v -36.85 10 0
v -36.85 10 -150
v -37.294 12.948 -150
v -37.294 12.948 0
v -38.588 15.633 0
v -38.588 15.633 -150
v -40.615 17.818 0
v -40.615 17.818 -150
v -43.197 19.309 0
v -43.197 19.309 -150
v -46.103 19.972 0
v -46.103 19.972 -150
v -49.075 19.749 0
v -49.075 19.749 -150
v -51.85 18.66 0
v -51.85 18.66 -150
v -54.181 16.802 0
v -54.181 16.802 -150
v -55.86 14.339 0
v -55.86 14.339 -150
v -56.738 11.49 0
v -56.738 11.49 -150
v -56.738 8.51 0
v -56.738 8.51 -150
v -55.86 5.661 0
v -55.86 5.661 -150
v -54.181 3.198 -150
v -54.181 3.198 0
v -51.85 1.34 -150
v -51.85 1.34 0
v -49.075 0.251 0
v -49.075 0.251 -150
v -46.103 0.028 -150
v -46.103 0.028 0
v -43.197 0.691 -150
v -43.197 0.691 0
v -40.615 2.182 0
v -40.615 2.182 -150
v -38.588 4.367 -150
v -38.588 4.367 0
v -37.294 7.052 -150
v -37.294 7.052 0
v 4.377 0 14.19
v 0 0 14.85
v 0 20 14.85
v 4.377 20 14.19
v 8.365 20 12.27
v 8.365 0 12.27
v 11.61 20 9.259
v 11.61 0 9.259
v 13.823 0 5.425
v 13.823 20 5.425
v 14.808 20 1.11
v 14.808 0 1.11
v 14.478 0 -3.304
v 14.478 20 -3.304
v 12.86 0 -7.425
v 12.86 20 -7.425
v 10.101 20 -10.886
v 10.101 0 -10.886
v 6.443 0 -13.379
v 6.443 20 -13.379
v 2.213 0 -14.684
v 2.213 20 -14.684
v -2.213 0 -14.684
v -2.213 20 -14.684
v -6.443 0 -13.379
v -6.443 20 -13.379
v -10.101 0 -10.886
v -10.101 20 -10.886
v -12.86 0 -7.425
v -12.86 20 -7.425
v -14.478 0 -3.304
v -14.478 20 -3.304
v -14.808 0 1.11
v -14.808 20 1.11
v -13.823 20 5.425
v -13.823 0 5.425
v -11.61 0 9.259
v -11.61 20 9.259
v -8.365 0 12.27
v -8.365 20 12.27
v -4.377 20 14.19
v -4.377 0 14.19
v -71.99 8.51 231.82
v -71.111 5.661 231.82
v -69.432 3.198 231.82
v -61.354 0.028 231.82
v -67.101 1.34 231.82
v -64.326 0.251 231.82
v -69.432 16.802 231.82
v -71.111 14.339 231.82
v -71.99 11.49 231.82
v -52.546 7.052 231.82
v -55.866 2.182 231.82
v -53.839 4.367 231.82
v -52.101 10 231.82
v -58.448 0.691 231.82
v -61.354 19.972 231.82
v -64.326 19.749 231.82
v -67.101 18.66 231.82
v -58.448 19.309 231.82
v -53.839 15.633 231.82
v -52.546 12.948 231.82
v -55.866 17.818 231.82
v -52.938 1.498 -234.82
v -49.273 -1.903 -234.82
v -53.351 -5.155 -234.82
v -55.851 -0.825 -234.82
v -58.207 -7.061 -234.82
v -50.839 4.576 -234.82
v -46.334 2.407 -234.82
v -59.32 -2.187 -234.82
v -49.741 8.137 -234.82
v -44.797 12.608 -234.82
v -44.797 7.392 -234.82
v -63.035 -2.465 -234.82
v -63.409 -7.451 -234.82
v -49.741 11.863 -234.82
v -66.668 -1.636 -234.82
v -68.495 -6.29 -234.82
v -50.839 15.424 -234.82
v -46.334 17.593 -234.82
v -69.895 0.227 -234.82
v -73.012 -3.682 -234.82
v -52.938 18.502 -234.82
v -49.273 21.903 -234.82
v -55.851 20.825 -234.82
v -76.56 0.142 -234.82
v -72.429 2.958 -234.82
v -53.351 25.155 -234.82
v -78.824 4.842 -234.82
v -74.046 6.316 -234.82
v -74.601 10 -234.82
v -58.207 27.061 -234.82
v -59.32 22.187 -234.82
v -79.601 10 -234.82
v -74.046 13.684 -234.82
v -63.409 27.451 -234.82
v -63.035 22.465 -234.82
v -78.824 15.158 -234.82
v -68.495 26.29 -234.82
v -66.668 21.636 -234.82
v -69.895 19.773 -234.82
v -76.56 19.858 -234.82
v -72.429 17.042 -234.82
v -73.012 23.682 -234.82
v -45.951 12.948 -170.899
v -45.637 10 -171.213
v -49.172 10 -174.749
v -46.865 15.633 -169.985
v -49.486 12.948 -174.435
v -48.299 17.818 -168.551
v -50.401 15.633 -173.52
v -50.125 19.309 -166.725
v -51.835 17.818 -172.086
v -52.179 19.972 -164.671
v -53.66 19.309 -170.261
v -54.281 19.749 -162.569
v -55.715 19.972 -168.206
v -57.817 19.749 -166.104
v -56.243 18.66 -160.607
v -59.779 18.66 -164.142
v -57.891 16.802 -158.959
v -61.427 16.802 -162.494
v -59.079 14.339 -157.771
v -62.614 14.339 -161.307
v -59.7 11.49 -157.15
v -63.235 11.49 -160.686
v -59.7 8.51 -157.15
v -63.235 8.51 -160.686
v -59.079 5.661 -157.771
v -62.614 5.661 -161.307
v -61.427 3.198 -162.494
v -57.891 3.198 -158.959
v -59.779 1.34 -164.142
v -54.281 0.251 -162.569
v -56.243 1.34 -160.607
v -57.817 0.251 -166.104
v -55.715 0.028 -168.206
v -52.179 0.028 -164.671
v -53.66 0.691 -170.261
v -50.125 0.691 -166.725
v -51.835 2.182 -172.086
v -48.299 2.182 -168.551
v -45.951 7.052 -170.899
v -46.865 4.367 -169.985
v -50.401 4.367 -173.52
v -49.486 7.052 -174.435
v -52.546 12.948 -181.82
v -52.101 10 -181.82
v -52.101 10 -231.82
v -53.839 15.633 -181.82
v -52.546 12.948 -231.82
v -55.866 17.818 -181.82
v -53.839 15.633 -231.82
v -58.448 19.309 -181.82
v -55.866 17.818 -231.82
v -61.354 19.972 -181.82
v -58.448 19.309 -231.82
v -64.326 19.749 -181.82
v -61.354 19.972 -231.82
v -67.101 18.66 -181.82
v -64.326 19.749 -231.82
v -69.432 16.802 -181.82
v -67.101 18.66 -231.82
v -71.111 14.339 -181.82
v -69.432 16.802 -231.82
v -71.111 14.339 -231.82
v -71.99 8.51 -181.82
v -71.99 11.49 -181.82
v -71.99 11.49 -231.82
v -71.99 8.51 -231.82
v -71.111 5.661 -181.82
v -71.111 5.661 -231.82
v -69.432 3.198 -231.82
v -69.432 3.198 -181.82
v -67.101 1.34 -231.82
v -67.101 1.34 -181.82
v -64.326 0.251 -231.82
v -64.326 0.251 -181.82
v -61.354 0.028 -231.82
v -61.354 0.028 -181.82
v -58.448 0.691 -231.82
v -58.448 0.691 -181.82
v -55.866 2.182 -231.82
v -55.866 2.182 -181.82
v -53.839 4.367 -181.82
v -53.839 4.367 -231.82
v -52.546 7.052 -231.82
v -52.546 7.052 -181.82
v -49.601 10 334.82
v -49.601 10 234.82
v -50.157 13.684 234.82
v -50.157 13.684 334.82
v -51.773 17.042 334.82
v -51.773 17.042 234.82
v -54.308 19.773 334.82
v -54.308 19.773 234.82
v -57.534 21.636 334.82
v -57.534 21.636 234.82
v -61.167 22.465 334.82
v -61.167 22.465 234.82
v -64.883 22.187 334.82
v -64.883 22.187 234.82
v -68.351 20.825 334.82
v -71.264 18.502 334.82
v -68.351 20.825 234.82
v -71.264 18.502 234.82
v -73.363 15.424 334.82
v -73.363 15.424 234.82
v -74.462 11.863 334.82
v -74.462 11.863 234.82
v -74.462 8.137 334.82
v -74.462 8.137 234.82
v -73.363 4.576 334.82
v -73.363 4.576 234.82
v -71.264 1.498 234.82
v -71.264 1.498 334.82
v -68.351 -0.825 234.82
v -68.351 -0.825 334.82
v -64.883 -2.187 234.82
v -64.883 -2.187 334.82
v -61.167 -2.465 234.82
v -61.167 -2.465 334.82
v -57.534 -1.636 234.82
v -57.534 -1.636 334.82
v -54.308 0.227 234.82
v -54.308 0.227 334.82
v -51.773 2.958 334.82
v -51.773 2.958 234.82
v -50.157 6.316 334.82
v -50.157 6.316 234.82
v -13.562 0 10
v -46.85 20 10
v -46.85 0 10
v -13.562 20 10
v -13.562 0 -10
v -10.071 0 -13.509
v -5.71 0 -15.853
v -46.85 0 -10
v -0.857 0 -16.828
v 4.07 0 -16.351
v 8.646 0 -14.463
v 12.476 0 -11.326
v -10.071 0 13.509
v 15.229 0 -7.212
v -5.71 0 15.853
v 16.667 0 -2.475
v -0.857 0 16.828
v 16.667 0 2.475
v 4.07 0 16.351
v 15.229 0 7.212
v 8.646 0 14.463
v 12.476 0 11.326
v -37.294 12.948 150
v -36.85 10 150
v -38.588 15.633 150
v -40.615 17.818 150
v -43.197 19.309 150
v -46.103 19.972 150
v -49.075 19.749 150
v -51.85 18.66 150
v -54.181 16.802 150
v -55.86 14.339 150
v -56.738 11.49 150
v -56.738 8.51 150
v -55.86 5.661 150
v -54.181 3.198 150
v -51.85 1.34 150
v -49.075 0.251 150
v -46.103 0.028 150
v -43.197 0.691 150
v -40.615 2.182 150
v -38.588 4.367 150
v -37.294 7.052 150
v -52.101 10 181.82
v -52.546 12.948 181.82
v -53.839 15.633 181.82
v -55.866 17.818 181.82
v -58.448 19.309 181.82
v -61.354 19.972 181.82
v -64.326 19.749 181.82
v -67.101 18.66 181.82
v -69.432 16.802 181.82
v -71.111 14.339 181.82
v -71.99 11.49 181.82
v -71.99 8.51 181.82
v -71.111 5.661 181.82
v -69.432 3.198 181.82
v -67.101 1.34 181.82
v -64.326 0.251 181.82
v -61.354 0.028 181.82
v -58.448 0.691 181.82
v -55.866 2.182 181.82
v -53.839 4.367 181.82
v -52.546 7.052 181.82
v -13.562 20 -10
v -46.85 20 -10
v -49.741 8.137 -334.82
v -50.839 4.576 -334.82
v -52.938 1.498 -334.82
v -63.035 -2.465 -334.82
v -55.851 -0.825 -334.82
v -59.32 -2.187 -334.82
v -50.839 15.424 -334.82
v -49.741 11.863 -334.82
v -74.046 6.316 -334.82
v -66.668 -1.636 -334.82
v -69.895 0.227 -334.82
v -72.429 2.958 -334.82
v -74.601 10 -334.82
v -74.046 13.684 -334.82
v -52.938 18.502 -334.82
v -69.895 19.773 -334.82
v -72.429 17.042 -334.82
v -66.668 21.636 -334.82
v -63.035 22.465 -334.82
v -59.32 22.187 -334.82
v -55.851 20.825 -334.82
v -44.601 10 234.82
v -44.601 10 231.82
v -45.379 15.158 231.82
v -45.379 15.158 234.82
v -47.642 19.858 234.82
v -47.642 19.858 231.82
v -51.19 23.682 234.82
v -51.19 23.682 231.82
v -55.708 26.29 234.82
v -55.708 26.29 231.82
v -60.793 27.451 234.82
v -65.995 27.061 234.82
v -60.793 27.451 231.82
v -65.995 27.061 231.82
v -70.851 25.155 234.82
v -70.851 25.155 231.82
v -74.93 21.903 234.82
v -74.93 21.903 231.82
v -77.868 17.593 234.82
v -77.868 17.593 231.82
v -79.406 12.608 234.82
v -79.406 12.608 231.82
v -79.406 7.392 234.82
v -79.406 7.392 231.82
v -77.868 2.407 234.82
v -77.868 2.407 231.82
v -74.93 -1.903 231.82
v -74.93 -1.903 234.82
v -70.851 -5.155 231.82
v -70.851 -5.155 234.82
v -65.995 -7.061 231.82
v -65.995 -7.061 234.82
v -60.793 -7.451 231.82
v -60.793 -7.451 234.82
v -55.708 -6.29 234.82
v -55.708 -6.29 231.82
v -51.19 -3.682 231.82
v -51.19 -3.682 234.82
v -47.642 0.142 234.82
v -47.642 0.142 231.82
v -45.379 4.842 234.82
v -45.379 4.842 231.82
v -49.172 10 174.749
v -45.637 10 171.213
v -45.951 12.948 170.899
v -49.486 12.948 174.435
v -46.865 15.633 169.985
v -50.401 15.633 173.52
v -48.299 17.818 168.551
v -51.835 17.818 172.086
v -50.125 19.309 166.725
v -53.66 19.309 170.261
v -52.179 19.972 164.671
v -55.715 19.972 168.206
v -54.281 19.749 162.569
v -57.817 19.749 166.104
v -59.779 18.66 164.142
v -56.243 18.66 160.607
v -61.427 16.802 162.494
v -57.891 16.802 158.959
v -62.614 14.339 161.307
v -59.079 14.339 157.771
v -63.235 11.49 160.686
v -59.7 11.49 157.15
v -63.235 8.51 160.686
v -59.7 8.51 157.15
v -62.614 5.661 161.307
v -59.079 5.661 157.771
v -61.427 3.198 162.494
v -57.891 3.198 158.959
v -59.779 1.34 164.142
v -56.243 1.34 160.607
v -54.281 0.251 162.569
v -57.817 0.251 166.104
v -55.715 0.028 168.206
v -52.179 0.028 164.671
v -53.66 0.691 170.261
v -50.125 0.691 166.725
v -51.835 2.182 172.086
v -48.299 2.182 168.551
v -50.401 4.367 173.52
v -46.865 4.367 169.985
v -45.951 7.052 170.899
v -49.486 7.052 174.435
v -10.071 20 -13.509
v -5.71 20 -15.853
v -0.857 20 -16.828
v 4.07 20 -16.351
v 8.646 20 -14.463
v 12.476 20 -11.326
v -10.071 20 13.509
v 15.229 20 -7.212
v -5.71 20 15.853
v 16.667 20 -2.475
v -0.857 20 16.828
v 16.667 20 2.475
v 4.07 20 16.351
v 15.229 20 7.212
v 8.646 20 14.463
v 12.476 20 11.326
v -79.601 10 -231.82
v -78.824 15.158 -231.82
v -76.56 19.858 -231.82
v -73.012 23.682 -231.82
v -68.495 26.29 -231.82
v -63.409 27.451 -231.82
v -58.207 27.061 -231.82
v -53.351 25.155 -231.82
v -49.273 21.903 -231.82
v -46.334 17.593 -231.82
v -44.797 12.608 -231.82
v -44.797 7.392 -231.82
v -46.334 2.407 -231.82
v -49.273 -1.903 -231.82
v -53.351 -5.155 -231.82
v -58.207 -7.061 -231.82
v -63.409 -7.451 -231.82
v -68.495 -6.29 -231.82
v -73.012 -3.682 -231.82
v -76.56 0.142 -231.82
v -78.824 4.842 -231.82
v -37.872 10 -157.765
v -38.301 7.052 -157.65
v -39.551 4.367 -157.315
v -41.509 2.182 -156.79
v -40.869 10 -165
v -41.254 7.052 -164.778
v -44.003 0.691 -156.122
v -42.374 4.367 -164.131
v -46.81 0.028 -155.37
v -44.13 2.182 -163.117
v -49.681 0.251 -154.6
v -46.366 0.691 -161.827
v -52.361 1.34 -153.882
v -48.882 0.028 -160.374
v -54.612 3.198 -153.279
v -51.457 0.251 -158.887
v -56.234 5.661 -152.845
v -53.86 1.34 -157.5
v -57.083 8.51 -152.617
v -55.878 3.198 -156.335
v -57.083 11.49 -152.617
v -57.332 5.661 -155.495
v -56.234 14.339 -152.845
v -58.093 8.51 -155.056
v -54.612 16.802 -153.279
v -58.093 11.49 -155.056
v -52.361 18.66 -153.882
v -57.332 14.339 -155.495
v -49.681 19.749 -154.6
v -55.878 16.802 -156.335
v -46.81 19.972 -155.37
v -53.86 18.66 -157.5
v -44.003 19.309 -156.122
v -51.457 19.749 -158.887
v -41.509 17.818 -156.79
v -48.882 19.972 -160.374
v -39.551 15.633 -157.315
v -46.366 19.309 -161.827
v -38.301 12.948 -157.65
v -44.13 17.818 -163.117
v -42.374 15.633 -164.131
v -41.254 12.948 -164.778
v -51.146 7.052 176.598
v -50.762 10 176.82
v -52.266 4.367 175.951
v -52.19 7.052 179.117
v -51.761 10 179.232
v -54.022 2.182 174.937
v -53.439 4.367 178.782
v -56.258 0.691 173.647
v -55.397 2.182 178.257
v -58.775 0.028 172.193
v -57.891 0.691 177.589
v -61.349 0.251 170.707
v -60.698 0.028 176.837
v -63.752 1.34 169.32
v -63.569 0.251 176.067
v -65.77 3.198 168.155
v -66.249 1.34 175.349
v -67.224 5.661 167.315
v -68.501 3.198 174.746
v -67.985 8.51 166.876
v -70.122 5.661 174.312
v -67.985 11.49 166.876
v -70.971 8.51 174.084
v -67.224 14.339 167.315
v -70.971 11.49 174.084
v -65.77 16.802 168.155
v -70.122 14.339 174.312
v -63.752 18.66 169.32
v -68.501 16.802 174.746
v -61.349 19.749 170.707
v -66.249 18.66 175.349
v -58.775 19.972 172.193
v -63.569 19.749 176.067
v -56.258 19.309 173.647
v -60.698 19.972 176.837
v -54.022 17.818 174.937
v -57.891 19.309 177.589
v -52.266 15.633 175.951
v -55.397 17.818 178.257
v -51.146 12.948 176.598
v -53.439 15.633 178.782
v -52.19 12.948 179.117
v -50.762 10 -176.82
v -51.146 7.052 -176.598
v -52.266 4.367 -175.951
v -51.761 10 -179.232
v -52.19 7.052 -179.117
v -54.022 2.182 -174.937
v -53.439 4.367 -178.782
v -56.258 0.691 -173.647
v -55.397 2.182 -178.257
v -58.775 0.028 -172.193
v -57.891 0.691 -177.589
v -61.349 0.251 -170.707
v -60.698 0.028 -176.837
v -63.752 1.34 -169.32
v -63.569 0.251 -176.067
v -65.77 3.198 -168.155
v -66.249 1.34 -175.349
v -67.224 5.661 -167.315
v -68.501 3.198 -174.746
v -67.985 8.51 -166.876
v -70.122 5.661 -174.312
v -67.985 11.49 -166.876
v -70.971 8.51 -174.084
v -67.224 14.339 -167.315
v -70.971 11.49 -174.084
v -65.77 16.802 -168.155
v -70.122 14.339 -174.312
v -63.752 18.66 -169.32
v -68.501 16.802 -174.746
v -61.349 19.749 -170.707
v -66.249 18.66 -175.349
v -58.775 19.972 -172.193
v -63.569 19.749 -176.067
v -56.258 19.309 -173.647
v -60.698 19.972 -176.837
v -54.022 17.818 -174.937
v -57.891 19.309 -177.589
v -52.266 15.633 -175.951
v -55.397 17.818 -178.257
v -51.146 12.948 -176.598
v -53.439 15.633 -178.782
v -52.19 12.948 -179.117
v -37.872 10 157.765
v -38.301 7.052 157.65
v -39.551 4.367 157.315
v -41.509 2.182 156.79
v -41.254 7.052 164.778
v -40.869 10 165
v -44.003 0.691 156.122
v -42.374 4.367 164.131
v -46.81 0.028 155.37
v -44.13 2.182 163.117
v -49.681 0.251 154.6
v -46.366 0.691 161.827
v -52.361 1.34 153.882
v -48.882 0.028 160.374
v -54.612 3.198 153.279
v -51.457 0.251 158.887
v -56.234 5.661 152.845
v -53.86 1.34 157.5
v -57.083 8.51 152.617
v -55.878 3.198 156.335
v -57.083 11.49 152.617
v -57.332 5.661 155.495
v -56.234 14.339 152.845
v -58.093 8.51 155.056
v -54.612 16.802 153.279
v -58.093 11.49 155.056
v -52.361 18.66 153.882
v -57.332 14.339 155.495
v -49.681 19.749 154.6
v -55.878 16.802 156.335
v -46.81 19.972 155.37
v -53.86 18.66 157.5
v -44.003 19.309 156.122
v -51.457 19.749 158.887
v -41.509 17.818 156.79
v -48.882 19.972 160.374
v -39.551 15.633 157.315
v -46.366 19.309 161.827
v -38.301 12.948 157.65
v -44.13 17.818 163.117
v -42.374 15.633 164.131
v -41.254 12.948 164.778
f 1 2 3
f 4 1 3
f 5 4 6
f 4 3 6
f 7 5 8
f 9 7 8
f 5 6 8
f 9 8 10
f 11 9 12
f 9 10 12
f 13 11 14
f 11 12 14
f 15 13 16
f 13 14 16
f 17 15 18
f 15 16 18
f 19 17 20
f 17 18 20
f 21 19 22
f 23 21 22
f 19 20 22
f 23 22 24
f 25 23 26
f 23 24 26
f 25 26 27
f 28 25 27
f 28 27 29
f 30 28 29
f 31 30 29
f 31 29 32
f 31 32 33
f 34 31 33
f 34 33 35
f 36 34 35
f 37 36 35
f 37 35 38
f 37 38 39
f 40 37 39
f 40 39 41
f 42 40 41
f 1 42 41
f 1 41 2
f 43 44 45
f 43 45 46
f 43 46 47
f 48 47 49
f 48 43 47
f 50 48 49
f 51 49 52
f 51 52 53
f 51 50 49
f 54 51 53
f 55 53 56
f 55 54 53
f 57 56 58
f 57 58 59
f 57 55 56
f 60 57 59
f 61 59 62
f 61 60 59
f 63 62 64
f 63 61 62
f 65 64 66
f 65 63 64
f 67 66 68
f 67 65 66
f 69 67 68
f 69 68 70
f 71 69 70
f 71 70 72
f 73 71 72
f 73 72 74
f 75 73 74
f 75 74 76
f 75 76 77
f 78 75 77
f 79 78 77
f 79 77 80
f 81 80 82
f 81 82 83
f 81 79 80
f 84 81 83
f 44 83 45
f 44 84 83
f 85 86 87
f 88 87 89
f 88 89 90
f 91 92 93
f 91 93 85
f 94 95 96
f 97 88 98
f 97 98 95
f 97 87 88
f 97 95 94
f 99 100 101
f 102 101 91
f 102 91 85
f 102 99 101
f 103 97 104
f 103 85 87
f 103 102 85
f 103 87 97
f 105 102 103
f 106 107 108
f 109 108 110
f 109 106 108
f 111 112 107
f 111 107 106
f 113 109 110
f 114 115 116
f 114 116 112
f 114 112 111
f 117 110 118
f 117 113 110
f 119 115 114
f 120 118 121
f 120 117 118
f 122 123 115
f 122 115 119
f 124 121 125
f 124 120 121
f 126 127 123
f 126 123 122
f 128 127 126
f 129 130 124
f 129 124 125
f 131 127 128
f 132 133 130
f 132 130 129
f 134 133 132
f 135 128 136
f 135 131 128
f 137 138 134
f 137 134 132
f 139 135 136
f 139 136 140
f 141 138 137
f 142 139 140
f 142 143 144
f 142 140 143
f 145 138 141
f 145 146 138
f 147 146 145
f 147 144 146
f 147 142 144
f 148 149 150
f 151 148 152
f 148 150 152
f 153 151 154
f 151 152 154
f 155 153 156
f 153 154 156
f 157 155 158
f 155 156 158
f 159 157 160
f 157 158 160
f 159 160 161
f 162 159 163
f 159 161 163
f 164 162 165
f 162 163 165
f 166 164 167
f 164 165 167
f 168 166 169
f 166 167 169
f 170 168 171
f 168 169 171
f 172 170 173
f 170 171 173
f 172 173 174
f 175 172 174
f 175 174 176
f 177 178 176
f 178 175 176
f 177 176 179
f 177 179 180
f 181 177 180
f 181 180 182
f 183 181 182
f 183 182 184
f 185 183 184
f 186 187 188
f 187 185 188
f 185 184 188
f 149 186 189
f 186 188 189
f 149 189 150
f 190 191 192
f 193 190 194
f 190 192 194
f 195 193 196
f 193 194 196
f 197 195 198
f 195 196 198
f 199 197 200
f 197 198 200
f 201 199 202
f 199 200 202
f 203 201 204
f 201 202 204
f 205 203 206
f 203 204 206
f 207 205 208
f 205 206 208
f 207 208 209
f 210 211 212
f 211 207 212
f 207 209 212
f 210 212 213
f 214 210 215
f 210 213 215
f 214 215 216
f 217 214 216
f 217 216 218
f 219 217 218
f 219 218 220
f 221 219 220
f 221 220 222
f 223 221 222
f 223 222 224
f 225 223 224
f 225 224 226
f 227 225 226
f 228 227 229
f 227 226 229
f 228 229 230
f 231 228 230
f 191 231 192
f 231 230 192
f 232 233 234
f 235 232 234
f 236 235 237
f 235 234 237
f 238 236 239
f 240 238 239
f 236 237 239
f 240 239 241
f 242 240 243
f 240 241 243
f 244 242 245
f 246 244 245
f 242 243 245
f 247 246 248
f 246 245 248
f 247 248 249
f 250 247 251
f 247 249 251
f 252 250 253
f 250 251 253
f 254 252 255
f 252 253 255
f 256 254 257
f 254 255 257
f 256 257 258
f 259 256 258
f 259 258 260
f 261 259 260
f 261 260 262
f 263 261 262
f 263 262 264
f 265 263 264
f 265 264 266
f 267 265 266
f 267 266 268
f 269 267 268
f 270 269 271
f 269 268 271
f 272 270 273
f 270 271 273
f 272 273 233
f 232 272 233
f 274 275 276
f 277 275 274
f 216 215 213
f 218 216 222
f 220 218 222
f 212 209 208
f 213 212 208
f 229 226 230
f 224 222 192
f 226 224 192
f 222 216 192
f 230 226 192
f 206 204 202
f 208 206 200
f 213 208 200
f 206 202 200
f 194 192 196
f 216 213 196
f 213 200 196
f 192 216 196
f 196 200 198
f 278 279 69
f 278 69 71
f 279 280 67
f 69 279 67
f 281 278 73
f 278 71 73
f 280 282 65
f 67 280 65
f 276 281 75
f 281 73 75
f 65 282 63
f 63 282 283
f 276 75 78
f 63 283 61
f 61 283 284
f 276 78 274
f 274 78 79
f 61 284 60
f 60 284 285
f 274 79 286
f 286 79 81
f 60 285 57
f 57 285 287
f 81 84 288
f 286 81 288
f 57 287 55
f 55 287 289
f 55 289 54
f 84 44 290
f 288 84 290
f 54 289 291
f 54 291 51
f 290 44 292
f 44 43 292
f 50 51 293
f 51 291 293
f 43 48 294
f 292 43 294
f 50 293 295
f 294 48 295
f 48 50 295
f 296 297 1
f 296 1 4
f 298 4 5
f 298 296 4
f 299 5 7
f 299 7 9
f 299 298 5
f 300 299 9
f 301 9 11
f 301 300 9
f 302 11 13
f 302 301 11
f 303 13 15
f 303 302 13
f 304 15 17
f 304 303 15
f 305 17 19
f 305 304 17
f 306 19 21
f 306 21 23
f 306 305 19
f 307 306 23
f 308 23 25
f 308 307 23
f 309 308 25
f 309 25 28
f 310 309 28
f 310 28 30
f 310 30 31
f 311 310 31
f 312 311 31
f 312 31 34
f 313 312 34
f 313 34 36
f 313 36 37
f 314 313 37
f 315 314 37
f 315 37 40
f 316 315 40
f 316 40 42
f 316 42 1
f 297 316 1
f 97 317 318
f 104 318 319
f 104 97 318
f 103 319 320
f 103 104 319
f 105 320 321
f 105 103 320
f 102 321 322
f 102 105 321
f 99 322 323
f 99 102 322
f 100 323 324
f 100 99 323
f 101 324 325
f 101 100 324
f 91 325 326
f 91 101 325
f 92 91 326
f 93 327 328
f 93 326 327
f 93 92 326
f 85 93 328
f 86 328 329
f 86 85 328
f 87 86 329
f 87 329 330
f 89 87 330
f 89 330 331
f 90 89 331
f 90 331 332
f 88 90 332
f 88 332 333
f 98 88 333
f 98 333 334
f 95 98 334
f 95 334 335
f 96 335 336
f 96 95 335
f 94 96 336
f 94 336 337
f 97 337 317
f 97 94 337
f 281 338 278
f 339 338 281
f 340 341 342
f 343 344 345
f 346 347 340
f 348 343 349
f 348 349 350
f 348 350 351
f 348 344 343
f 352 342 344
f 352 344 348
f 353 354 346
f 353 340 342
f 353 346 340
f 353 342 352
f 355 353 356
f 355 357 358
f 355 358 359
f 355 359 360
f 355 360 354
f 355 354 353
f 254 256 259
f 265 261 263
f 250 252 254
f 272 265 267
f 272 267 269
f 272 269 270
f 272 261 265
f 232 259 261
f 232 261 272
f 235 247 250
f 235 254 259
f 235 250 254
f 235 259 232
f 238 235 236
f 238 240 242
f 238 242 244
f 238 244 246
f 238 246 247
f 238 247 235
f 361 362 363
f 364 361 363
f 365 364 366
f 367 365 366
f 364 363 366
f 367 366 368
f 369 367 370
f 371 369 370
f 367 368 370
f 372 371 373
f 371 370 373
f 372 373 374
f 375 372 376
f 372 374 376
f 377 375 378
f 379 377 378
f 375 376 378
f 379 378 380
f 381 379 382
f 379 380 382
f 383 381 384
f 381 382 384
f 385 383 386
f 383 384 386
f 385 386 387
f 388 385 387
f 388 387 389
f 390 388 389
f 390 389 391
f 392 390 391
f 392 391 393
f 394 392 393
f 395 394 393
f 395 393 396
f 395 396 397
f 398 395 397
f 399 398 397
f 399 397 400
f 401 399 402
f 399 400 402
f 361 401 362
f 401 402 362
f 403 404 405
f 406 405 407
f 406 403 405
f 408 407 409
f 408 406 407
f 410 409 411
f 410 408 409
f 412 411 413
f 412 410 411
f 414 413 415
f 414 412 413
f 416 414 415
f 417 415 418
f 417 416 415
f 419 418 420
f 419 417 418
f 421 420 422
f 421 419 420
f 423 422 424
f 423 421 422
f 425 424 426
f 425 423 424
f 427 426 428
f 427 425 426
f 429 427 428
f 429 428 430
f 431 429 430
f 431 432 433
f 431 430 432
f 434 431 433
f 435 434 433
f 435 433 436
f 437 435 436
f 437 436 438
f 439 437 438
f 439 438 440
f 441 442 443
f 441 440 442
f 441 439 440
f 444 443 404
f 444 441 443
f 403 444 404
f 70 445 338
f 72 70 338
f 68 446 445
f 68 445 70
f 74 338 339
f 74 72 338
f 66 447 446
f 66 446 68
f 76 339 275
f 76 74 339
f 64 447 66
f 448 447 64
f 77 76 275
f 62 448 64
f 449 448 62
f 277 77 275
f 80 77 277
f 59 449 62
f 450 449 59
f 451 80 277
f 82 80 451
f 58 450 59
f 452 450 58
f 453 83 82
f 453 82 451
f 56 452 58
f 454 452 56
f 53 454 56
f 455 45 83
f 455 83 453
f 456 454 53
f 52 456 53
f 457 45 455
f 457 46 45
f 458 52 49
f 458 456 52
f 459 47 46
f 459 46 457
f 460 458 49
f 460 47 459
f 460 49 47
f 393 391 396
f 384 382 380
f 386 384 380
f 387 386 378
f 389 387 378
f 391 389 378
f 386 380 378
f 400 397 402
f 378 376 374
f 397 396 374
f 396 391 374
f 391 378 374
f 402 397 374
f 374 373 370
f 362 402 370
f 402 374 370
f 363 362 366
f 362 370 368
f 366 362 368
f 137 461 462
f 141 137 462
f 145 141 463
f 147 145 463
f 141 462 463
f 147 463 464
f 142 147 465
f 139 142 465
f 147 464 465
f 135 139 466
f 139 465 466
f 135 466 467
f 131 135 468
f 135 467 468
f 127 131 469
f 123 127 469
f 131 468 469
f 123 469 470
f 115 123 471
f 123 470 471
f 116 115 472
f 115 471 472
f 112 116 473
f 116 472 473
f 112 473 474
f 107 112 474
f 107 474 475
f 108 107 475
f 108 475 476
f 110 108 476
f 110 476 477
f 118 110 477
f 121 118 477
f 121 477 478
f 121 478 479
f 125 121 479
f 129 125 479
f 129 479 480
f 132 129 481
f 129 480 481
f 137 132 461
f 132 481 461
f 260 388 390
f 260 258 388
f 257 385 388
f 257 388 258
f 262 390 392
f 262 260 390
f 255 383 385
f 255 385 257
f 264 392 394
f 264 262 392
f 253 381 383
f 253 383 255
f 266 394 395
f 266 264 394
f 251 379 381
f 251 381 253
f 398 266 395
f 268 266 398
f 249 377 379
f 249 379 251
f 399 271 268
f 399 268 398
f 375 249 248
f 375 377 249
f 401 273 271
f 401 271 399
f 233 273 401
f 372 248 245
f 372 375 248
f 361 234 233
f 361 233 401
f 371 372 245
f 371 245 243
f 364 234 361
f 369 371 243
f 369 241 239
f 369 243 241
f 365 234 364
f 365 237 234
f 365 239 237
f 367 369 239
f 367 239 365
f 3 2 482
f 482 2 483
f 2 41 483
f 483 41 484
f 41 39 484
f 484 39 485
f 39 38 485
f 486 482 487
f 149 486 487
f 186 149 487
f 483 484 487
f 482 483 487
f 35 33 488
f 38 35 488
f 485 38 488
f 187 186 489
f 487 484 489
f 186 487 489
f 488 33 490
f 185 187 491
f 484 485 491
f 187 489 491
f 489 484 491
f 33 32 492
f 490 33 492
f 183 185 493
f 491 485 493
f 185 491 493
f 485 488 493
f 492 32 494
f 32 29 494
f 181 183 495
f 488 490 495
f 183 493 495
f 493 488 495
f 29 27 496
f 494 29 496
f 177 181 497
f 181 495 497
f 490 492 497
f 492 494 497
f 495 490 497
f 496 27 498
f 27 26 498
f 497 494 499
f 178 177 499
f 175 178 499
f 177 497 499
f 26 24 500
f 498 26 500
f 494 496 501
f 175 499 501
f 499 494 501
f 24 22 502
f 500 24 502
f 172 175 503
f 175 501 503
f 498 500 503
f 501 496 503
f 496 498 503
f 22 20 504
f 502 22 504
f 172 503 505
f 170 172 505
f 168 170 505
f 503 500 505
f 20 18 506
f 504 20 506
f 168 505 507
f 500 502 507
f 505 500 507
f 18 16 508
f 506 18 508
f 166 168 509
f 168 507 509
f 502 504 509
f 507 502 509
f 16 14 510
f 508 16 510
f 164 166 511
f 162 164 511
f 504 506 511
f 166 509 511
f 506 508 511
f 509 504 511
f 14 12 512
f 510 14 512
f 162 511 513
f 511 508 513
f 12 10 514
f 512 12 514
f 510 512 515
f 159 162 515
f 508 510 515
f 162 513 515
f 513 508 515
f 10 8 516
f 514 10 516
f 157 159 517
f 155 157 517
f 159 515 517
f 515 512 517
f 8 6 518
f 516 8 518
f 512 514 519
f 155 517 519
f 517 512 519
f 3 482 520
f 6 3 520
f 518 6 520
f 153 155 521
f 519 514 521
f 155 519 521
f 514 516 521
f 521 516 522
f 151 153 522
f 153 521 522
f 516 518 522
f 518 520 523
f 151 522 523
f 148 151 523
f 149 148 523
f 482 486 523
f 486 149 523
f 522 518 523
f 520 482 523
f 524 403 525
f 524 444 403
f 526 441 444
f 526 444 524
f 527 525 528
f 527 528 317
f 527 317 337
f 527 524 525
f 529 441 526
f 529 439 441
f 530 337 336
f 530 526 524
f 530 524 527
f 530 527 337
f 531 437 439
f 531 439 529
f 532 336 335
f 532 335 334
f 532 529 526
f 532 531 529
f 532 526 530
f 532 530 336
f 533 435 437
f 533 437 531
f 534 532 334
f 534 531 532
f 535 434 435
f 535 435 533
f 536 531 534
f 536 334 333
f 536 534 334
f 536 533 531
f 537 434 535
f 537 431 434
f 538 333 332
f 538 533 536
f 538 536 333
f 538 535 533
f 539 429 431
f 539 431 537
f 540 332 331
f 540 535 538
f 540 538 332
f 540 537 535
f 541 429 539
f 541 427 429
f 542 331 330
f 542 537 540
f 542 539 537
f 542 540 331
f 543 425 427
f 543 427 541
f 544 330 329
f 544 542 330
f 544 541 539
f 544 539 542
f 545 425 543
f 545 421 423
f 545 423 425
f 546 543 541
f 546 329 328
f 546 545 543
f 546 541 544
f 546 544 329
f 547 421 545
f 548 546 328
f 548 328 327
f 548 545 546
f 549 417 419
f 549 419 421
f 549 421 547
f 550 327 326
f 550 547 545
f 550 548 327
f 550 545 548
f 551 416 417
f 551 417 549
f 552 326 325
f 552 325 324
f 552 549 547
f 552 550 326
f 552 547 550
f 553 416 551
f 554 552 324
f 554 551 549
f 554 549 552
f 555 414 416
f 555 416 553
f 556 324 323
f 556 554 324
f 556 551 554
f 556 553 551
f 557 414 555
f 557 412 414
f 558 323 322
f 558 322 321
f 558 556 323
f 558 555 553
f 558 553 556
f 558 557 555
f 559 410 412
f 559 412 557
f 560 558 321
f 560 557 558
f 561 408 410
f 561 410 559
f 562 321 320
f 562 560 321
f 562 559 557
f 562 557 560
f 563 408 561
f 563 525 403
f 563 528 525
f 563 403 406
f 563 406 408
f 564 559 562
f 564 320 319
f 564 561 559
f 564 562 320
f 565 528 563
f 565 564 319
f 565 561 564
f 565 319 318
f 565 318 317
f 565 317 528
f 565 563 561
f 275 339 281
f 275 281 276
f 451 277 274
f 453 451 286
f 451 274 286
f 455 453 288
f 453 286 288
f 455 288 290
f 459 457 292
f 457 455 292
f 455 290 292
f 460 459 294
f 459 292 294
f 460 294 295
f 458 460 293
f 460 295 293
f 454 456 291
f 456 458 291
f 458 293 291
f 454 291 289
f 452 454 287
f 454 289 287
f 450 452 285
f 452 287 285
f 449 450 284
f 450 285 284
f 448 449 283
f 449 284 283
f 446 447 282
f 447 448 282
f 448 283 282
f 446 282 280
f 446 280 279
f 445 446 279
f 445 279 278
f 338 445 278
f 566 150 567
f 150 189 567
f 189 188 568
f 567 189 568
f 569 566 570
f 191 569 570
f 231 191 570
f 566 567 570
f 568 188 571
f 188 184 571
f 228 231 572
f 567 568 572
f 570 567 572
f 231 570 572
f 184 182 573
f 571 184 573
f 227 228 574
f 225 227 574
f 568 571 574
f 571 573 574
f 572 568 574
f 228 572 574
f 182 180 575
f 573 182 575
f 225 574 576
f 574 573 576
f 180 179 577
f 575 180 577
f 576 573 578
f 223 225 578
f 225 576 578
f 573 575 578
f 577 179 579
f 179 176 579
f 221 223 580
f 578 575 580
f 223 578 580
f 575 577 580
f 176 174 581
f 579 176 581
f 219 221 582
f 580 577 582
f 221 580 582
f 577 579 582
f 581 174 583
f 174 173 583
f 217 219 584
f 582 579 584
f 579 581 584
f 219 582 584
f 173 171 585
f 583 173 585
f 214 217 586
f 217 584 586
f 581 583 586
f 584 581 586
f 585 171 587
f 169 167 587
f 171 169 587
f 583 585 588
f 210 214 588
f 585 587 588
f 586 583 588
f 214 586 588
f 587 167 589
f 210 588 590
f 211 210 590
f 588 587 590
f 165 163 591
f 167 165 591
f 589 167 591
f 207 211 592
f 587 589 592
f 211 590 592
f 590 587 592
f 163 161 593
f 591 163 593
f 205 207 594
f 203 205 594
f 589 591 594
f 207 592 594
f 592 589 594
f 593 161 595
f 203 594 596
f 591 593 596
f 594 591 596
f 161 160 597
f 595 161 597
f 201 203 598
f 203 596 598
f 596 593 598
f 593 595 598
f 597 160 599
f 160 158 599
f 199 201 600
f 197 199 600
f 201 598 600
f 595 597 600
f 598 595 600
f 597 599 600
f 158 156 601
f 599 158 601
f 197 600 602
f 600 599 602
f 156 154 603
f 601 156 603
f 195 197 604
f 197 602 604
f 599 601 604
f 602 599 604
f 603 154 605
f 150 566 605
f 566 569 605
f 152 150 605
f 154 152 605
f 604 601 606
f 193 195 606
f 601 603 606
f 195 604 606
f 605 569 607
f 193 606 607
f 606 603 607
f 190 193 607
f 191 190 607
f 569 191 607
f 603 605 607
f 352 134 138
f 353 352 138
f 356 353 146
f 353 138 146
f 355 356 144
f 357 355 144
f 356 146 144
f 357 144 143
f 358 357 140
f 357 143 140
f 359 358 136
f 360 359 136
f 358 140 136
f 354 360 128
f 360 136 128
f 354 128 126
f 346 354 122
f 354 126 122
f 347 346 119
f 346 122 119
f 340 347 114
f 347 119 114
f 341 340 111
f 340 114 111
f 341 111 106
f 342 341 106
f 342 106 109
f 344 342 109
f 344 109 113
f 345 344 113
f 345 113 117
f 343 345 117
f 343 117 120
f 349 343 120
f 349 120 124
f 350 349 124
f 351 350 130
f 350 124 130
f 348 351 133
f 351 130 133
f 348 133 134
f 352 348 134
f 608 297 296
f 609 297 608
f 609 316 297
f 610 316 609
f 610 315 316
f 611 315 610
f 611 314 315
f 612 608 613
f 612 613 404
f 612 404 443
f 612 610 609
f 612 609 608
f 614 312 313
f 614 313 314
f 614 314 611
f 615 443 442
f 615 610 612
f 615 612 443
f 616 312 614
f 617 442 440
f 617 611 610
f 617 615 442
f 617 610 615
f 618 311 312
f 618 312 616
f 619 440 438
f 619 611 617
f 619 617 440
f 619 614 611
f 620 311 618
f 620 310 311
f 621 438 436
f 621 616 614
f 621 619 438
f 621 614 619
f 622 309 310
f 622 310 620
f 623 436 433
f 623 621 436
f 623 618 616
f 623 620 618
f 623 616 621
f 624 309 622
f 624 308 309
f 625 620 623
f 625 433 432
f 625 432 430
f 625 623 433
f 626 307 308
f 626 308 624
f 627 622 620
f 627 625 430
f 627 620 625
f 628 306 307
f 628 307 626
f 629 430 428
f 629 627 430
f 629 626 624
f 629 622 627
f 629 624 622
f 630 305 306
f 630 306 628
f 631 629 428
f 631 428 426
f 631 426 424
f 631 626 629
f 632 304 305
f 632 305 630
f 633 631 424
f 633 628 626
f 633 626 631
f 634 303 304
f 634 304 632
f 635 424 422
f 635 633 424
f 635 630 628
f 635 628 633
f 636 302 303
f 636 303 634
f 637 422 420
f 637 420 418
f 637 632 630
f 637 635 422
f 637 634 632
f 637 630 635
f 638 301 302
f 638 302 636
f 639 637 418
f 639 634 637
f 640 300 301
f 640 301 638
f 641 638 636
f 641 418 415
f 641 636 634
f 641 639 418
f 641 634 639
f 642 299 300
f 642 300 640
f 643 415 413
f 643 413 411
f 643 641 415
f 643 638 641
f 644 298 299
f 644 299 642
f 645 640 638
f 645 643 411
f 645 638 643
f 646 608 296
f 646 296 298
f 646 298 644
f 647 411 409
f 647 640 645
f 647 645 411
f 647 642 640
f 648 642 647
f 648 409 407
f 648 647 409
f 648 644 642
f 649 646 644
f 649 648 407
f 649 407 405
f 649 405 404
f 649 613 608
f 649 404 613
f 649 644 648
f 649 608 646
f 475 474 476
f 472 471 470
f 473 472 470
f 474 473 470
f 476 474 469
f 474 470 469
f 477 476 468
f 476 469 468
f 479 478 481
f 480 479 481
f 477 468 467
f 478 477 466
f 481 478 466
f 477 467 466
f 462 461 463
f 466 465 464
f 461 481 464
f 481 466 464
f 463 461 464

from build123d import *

# Parameters (mm, degrees)
SKETCH1_R           = 16.85
SKETCH1_R_2         = 14.85
BOSS_EXTRUDE1_DEPTH = 20
SKETCH2_R           = 10
SKETCH5_R           = 17.5
BOSS_EXTRUDE3_DEPTH = 3
SKETCH6_R           = 12.5
BOSS_EXTRUDE4_DEPTH = 100
BOSS_EXTRUDE2_DEPTH = 20
SKETCH7_R           = 17.5
BOSS_EXTRUDE5_DEPTH = 3
SKETCH8_R           = 12.5
BOSS_EXTRUDE6_DEPTH = 100


with BuildPart() as part:
    # Sketch1 → Boss-Extrude1 (new body)
    with BuildSketch(Plane(origin=(0, 0, 0), x_dir=(1, 0, 0), z_dir=(0, 1, 0))):
        with Locations(Location((0, 0, 0), (0, 0, 270))):
            Circle(SKETCH1_R)
        with Locations(Location((0, 0, 0), (0, 0, 270))):
            Circle(SKETCH1_R_2, mode=Mode.SUBTRACT)
    extrude(amount=BOSS_EXTRUDE1_DEPTH)

    # Sketch4 → Boss-Extrude2 (add)
    with BuildSketch(Plane(origin=(0, 20, 0), x_dir=(1, 0, 0), z_dir=(0, 1, 0))):
        with BuildLine():
            Line((-13.561802977, 10), (-46.85, 10))
            Line((-46.85, 10), (-46.85, -10))
            Line((-46.85, -10), (-13.561802977, -10))
            ThreePointArc((-13.561802977, -10), (-16.85, 0), (-13.561802977, 10))
        make_face()
    extrude(amount=-BOSS_EXTRUDE2_DEPTH)


with BuildPart() as body_2:
    # Sweep1: sweep along a path in Sketch3
    with BuildLine(Plane(origin=(0, 0, 0), x_dir=(1, 0, 0), z_dir=(0, 1, 0))) as sweep1_path:
        Line((-46.85, 0), (-46.85, -150))
        ThreePointArc((-46.85, -150), (-48.37240935, -157.653668647), (-52.707864376, -164.142135624))
        Line((-52.707864376, -164.142135624), (-56.243398282, -167.67766953))
        ThreePointArc((-56.243398282, -167.67766953), (-60.578853309, -174.166136506), (-62.101262658, -181.819805153))
        Line((-62.101262658, -181.819805153), (-62.101262658, -231.819805153))
    # Sketch2 → Sweep1 (sweep)
    with BuildSketch(Plane.XY):
        with Locations((-46.85, 10)):
            Circle(SKETCH2_R)
    sweep1 = sweep(path=sweep1_path.line)

    # Mirror1: Sweep1 across plane
    add(sweep1.mirror(Plane(origin=(-46.85, 10, 0), x_dir=(1, 0, 0), z_dir=(0, 0, 1))))


with BuildPart() as body_3:
    # Sketch5 → Boss-Extrude3 (new body)
    with BuildSketch(Plane.XY.offset(231.819805153)):
        with Locations((-62.101262658, 10)):
            Circle(SKETCH5_R)
    extrude(amount=BOSS_EXTRUDE3_DEPTH)

    # Sketch6 → Boss-Extrude4 (add)
    with BuildSketch(Plane.XY.offset(234.819805153)):
        with Locations((-62.101262658, 10)):
            Circle(SKETCH6_R)
    extrude(amount=BOSS_EXTRUDE4_DEPTH)


with BuildPart() as body_4:
    # Sketch7 → Boss-Extrude5 (new body)
    with BuildSketch(Plane(origin=(0, 0, -231.819805153), x_dir=(-1, 0, 0), z_dir=(0, 0, -1))):
        with Locations((62.101262658, 10)):
            Circle(SKETCH7_R)
    extrude(amount=BOSS_EXTRUDE5_DEPTH)

    # Sketch8 → Boss-Extrude6 (add)
    with BuildSketch(Plane(origin=(0, 0, -234.819805153), x_dir=(-1, 0, 0), z_dir=(0, 0, -1))):
        with Locations((62.101262658, 10)):
            Circle(SKETCH8_R)
    extrude(amount=BOSS_EXTRUDE6_DEPTH)


solid = Compound([part.part, body_2.part, body_3.part, body_4.part])
